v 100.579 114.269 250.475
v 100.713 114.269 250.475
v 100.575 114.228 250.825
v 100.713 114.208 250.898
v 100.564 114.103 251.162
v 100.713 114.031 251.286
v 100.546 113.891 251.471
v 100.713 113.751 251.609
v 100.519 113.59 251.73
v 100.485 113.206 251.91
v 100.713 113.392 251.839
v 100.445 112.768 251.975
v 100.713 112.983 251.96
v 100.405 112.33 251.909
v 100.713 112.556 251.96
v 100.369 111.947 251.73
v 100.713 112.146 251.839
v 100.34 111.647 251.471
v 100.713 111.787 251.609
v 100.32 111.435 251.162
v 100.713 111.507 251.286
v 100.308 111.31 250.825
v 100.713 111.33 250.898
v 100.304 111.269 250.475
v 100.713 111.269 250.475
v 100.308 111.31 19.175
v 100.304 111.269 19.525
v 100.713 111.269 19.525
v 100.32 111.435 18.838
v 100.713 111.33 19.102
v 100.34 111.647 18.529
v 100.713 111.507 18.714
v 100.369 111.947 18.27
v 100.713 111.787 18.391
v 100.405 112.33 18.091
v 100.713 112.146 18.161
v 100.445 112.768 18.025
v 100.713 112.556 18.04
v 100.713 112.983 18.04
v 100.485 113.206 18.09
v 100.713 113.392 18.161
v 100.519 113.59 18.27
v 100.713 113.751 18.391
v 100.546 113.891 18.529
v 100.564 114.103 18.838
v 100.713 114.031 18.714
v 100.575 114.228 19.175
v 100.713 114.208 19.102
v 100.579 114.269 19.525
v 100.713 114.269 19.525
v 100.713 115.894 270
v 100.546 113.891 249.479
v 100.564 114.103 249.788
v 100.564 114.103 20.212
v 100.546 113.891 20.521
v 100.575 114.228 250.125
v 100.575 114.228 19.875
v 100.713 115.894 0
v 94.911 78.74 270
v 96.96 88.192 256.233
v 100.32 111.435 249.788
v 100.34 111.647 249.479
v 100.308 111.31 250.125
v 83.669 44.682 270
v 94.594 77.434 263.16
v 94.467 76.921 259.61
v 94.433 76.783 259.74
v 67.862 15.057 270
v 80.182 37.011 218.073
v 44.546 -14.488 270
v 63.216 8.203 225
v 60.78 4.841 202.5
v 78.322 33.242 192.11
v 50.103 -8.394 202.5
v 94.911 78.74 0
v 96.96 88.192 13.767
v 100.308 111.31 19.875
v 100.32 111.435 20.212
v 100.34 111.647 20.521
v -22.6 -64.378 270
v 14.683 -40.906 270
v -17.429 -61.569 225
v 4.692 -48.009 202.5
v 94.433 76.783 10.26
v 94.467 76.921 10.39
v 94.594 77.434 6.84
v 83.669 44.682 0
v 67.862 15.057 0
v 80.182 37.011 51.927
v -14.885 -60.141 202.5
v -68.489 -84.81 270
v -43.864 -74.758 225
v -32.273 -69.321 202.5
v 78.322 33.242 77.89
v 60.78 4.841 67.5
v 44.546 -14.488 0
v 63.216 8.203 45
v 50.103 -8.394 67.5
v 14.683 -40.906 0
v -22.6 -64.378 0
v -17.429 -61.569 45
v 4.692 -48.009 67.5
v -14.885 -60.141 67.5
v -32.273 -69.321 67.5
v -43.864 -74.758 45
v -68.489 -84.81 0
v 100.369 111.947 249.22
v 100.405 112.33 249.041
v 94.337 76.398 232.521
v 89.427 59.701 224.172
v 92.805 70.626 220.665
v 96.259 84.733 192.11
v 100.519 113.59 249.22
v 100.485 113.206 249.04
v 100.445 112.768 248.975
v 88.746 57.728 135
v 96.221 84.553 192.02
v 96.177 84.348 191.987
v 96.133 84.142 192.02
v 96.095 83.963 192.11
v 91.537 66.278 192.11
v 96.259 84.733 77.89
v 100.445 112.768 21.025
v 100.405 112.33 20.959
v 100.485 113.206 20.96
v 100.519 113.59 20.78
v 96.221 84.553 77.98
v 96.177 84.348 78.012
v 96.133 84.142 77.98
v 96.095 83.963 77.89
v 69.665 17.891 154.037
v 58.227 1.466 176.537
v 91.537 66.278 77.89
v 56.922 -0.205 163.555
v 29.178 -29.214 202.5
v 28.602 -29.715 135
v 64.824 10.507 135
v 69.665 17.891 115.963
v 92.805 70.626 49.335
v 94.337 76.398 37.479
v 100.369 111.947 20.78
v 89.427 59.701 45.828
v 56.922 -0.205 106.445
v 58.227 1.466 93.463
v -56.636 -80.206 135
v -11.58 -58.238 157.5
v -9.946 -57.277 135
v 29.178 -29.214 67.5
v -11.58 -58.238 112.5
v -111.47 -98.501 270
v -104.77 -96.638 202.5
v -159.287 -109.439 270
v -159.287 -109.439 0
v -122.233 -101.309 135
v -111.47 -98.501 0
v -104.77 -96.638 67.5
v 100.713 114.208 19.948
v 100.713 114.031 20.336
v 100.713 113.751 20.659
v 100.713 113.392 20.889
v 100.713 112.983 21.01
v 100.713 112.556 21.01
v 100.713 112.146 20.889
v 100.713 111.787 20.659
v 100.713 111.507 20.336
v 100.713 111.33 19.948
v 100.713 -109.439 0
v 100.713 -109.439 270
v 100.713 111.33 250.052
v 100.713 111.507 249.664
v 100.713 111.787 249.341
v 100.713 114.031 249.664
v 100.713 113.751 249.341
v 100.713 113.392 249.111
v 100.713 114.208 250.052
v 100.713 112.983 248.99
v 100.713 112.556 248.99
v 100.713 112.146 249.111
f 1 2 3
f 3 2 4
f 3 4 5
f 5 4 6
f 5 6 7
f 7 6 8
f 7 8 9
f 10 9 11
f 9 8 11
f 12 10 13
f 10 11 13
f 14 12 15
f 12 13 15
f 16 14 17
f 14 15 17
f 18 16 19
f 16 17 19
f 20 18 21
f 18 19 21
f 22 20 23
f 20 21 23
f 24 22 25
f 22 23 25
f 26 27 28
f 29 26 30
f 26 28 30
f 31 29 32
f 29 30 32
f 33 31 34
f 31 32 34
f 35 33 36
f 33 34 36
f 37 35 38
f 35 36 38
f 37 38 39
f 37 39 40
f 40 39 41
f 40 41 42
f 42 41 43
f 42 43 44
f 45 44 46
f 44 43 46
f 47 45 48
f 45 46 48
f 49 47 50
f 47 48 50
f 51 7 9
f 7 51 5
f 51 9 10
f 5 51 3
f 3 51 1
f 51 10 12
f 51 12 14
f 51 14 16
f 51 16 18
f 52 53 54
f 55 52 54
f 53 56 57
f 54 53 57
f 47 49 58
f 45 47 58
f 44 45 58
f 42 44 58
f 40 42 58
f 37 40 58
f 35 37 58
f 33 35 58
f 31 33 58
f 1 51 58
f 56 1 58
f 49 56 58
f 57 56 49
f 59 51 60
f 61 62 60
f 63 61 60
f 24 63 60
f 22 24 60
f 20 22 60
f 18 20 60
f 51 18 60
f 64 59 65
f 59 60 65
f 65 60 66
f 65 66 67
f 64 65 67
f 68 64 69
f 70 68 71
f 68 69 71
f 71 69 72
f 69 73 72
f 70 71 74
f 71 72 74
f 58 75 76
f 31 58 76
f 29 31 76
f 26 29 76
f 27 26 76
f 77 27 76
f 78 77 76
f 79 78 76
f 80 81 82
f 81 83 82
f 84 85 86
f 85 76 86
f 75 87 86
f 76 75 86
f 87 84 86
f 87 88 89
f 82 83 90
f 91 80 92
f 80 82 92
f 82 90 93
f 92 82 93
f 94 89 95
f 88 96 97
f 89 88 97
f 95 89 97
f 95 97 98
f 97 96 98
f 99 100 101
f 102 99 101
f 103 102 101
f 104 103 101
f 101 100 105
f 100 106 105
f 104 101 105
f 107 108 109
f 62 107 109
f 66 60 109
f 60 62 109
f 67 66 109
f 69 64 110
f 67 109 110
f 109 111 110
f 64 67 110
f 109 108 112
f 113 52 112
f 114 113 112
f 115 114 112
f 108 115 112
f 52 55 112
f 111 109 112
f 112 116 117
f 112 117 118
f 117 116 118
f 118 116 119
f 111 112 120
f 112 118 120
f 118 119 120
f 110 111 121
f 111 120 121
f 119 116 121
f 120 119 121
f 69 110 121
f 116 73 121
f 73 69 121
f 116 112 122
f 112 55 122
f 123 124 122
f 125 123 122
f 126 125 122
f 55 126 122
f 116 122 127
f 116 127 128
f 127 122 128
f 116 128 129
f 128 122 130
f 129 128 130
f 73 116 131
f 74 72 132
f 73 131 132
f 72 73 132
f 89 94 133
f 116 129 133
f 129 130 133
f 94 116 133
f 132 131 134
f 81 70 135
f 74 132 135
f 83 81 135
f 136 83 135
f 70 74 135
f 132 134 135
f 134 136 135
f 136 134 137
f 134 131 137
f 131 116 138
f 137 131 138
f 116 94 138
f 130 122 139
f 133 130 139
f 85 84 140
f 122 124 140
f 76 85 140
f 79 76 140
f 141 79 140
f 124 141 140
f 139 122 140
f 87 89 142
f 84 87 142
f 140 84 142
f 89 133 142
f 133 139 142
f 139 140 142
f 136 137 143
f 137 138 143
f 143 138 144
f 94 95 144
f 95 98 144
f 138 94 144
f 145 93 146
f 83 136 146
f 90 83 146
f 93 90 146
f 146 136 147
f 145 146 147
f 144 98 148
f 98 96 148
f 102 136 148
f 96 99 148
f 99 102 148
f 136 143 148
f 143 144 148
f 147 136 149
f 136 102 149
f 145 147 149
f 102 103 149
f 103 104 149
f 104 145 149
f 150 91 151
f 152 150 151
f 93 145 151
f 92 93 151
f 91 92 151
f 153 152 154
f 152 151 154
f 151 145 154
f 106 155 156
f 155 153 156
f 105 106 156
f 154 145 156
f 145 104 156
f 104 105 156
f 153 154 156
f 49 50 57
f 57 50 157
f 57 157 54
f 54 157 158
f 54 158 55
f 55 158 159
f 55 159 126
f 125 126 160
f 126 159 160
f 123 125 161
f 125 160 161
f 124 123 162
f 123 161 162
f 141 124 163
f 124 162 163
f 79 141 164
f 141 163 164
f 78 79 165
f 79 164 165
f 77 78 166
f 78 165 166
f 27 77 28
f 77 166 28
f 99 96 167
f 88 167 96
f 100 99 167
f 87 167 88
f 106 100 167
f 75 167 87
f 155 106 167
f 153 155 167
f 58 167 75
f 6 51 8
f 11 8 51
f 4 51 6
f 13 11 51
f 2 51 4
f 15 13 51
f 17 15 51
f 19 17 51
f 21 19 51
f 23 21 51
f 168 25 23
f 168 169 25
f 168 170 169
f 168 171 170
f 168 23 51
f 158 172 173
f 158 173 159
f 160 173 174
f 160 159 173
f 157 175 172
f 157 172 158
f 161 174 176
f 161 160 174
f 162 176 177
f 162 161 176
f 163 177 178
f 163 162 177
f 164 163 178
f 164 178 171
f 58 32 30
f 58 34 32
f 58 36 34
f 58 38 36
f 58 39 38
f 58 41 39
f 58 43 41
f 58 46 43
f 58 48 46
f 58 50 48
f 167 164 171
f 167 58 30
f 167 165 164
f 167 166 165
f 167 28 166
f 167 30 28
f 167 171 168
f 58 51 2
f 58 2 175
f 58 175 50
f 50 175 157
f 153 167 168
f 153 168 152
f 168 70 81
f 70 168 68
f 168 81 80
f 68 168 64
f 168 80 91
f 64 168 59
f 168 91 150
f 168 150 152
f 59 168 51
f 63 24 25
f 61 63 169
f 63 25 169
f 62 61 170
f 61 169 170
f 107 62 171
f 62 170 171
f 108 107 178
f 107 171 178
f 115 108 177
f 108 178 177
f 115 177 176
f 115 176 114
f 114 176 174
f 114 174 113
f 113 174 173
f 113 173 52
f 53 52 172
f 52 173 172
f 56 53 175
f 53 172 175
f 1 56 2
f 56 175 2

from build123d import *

# Parameters (mm, degrees)
SALIENTE_EXTRUIR1_DEPTH = 270


with BuildPart() as part:
    # Croquis1 → Saliente-Extruir1 (new body)
    with BuildSketch(Plane.XY):
        with BuildLine():
            Line((100.713061676, 115.894152269), (100.713061676, -109.438674176))
            Line((100.713061676, -109.438674176), (-159.286938324, -109.438674176))
            add(Edge.make_bspline(
                [(100.713061676, 115.894152269), (86.491229744, -62.657074826), (-159.286938324, -109.438674176)],
                knots=[0, 0, 0, 1, 1, 1], degree=2))
        make_face()
    extrude(amount=SALIENTE_EXTRUIR1_DEPTH)

    # Cortar-Extruir1: read off the stored shape, not the designer's step
    # Cortar-Extruir1: loft between two sections, ruled curve by curve
    cortar_extruir1_from = [
        Edge.make_three_point_arc((100.303649048, 114.269152269, 250.475), (100.303649048, 112.769152269, 251.975), (100.303649048, 111.269152269, 250.475)),
        Edge.make_three_point_arc((100.303649048, 111.269152269, 250.475), (100.303649048, 112.769152269, 248.975), (100.303649048, 114.269152269, 250.475)),
    ]
    cortar_extruir1_to = [
        Edge.make_three_point_arc((100.713061676, 114.269152269, 250.475), (100.713061676, 112.769152269, 251.975), (100.713061676, 111.269152269, 250.475)),
        Edge.make_three_point_arc((100.713061676, 111.269152269, 250.475), (100.713061676, 112.769152269, 248.975), (100.713061676, 114.269152269, 250.475)),
    ]
    cortar_extruir1 = Solid(Shell([*[Face.make_surface_from_curves(cortar_extruir1_from[k], cortar_extruir1_to[k]) for k in range(2)], Face(Wire(cortar_extruir1_from)), Face(Wire(cortar_extruir1_to))]))
    add(cortar_extruir1, mode=Mode.SUBTRACT)

    # Cortar-Extruir1 2: loft between two sections, ruled curve by curve
    cortar_extruir1_2_from = [
        Edge.make_three_point_arc((100.303649048, 114.269152269, 19.525), (100.303649048, 112.769152269, 21.025), (100.303649048, 111.269152269, 19.525)),
        Edge.make_three_point_arc((100.303649048, 111.269152269, 19.525), (100.303649048, 112.769152269, 18.025), (100.303649048, 114.269152269, 19.525)),
    ]
    cortar_extruir1_2_to = [
        Edge.make_three_point_arc((100.713061676, 114.269152269, 19.525), (100.713061676, 112.769152269, 21.025), (100.713061676, 111.269152269, 19.525)),
        Edge.make_three_point_arc((100.713061676, 111.269152269, 19.525), (100.713061676, 112.769152269, 18.025), (100.713061676, 114.269152269, 19.525)),
    ]
    cortar_extruir1_2 = Solid(Shell([*[Face.make_surface_from_curves(cortar_extruir1_2_from[k], cortar_extruir1_2_to[k]) for k in range(2)], Face(Wire(cortar_extruir1_2_from)), Face(Wire(cortar_extruir1_2_to))]))
    add(cortar_extruir1_2, mode=Mode.SUBTRACT)


solid = part.part
